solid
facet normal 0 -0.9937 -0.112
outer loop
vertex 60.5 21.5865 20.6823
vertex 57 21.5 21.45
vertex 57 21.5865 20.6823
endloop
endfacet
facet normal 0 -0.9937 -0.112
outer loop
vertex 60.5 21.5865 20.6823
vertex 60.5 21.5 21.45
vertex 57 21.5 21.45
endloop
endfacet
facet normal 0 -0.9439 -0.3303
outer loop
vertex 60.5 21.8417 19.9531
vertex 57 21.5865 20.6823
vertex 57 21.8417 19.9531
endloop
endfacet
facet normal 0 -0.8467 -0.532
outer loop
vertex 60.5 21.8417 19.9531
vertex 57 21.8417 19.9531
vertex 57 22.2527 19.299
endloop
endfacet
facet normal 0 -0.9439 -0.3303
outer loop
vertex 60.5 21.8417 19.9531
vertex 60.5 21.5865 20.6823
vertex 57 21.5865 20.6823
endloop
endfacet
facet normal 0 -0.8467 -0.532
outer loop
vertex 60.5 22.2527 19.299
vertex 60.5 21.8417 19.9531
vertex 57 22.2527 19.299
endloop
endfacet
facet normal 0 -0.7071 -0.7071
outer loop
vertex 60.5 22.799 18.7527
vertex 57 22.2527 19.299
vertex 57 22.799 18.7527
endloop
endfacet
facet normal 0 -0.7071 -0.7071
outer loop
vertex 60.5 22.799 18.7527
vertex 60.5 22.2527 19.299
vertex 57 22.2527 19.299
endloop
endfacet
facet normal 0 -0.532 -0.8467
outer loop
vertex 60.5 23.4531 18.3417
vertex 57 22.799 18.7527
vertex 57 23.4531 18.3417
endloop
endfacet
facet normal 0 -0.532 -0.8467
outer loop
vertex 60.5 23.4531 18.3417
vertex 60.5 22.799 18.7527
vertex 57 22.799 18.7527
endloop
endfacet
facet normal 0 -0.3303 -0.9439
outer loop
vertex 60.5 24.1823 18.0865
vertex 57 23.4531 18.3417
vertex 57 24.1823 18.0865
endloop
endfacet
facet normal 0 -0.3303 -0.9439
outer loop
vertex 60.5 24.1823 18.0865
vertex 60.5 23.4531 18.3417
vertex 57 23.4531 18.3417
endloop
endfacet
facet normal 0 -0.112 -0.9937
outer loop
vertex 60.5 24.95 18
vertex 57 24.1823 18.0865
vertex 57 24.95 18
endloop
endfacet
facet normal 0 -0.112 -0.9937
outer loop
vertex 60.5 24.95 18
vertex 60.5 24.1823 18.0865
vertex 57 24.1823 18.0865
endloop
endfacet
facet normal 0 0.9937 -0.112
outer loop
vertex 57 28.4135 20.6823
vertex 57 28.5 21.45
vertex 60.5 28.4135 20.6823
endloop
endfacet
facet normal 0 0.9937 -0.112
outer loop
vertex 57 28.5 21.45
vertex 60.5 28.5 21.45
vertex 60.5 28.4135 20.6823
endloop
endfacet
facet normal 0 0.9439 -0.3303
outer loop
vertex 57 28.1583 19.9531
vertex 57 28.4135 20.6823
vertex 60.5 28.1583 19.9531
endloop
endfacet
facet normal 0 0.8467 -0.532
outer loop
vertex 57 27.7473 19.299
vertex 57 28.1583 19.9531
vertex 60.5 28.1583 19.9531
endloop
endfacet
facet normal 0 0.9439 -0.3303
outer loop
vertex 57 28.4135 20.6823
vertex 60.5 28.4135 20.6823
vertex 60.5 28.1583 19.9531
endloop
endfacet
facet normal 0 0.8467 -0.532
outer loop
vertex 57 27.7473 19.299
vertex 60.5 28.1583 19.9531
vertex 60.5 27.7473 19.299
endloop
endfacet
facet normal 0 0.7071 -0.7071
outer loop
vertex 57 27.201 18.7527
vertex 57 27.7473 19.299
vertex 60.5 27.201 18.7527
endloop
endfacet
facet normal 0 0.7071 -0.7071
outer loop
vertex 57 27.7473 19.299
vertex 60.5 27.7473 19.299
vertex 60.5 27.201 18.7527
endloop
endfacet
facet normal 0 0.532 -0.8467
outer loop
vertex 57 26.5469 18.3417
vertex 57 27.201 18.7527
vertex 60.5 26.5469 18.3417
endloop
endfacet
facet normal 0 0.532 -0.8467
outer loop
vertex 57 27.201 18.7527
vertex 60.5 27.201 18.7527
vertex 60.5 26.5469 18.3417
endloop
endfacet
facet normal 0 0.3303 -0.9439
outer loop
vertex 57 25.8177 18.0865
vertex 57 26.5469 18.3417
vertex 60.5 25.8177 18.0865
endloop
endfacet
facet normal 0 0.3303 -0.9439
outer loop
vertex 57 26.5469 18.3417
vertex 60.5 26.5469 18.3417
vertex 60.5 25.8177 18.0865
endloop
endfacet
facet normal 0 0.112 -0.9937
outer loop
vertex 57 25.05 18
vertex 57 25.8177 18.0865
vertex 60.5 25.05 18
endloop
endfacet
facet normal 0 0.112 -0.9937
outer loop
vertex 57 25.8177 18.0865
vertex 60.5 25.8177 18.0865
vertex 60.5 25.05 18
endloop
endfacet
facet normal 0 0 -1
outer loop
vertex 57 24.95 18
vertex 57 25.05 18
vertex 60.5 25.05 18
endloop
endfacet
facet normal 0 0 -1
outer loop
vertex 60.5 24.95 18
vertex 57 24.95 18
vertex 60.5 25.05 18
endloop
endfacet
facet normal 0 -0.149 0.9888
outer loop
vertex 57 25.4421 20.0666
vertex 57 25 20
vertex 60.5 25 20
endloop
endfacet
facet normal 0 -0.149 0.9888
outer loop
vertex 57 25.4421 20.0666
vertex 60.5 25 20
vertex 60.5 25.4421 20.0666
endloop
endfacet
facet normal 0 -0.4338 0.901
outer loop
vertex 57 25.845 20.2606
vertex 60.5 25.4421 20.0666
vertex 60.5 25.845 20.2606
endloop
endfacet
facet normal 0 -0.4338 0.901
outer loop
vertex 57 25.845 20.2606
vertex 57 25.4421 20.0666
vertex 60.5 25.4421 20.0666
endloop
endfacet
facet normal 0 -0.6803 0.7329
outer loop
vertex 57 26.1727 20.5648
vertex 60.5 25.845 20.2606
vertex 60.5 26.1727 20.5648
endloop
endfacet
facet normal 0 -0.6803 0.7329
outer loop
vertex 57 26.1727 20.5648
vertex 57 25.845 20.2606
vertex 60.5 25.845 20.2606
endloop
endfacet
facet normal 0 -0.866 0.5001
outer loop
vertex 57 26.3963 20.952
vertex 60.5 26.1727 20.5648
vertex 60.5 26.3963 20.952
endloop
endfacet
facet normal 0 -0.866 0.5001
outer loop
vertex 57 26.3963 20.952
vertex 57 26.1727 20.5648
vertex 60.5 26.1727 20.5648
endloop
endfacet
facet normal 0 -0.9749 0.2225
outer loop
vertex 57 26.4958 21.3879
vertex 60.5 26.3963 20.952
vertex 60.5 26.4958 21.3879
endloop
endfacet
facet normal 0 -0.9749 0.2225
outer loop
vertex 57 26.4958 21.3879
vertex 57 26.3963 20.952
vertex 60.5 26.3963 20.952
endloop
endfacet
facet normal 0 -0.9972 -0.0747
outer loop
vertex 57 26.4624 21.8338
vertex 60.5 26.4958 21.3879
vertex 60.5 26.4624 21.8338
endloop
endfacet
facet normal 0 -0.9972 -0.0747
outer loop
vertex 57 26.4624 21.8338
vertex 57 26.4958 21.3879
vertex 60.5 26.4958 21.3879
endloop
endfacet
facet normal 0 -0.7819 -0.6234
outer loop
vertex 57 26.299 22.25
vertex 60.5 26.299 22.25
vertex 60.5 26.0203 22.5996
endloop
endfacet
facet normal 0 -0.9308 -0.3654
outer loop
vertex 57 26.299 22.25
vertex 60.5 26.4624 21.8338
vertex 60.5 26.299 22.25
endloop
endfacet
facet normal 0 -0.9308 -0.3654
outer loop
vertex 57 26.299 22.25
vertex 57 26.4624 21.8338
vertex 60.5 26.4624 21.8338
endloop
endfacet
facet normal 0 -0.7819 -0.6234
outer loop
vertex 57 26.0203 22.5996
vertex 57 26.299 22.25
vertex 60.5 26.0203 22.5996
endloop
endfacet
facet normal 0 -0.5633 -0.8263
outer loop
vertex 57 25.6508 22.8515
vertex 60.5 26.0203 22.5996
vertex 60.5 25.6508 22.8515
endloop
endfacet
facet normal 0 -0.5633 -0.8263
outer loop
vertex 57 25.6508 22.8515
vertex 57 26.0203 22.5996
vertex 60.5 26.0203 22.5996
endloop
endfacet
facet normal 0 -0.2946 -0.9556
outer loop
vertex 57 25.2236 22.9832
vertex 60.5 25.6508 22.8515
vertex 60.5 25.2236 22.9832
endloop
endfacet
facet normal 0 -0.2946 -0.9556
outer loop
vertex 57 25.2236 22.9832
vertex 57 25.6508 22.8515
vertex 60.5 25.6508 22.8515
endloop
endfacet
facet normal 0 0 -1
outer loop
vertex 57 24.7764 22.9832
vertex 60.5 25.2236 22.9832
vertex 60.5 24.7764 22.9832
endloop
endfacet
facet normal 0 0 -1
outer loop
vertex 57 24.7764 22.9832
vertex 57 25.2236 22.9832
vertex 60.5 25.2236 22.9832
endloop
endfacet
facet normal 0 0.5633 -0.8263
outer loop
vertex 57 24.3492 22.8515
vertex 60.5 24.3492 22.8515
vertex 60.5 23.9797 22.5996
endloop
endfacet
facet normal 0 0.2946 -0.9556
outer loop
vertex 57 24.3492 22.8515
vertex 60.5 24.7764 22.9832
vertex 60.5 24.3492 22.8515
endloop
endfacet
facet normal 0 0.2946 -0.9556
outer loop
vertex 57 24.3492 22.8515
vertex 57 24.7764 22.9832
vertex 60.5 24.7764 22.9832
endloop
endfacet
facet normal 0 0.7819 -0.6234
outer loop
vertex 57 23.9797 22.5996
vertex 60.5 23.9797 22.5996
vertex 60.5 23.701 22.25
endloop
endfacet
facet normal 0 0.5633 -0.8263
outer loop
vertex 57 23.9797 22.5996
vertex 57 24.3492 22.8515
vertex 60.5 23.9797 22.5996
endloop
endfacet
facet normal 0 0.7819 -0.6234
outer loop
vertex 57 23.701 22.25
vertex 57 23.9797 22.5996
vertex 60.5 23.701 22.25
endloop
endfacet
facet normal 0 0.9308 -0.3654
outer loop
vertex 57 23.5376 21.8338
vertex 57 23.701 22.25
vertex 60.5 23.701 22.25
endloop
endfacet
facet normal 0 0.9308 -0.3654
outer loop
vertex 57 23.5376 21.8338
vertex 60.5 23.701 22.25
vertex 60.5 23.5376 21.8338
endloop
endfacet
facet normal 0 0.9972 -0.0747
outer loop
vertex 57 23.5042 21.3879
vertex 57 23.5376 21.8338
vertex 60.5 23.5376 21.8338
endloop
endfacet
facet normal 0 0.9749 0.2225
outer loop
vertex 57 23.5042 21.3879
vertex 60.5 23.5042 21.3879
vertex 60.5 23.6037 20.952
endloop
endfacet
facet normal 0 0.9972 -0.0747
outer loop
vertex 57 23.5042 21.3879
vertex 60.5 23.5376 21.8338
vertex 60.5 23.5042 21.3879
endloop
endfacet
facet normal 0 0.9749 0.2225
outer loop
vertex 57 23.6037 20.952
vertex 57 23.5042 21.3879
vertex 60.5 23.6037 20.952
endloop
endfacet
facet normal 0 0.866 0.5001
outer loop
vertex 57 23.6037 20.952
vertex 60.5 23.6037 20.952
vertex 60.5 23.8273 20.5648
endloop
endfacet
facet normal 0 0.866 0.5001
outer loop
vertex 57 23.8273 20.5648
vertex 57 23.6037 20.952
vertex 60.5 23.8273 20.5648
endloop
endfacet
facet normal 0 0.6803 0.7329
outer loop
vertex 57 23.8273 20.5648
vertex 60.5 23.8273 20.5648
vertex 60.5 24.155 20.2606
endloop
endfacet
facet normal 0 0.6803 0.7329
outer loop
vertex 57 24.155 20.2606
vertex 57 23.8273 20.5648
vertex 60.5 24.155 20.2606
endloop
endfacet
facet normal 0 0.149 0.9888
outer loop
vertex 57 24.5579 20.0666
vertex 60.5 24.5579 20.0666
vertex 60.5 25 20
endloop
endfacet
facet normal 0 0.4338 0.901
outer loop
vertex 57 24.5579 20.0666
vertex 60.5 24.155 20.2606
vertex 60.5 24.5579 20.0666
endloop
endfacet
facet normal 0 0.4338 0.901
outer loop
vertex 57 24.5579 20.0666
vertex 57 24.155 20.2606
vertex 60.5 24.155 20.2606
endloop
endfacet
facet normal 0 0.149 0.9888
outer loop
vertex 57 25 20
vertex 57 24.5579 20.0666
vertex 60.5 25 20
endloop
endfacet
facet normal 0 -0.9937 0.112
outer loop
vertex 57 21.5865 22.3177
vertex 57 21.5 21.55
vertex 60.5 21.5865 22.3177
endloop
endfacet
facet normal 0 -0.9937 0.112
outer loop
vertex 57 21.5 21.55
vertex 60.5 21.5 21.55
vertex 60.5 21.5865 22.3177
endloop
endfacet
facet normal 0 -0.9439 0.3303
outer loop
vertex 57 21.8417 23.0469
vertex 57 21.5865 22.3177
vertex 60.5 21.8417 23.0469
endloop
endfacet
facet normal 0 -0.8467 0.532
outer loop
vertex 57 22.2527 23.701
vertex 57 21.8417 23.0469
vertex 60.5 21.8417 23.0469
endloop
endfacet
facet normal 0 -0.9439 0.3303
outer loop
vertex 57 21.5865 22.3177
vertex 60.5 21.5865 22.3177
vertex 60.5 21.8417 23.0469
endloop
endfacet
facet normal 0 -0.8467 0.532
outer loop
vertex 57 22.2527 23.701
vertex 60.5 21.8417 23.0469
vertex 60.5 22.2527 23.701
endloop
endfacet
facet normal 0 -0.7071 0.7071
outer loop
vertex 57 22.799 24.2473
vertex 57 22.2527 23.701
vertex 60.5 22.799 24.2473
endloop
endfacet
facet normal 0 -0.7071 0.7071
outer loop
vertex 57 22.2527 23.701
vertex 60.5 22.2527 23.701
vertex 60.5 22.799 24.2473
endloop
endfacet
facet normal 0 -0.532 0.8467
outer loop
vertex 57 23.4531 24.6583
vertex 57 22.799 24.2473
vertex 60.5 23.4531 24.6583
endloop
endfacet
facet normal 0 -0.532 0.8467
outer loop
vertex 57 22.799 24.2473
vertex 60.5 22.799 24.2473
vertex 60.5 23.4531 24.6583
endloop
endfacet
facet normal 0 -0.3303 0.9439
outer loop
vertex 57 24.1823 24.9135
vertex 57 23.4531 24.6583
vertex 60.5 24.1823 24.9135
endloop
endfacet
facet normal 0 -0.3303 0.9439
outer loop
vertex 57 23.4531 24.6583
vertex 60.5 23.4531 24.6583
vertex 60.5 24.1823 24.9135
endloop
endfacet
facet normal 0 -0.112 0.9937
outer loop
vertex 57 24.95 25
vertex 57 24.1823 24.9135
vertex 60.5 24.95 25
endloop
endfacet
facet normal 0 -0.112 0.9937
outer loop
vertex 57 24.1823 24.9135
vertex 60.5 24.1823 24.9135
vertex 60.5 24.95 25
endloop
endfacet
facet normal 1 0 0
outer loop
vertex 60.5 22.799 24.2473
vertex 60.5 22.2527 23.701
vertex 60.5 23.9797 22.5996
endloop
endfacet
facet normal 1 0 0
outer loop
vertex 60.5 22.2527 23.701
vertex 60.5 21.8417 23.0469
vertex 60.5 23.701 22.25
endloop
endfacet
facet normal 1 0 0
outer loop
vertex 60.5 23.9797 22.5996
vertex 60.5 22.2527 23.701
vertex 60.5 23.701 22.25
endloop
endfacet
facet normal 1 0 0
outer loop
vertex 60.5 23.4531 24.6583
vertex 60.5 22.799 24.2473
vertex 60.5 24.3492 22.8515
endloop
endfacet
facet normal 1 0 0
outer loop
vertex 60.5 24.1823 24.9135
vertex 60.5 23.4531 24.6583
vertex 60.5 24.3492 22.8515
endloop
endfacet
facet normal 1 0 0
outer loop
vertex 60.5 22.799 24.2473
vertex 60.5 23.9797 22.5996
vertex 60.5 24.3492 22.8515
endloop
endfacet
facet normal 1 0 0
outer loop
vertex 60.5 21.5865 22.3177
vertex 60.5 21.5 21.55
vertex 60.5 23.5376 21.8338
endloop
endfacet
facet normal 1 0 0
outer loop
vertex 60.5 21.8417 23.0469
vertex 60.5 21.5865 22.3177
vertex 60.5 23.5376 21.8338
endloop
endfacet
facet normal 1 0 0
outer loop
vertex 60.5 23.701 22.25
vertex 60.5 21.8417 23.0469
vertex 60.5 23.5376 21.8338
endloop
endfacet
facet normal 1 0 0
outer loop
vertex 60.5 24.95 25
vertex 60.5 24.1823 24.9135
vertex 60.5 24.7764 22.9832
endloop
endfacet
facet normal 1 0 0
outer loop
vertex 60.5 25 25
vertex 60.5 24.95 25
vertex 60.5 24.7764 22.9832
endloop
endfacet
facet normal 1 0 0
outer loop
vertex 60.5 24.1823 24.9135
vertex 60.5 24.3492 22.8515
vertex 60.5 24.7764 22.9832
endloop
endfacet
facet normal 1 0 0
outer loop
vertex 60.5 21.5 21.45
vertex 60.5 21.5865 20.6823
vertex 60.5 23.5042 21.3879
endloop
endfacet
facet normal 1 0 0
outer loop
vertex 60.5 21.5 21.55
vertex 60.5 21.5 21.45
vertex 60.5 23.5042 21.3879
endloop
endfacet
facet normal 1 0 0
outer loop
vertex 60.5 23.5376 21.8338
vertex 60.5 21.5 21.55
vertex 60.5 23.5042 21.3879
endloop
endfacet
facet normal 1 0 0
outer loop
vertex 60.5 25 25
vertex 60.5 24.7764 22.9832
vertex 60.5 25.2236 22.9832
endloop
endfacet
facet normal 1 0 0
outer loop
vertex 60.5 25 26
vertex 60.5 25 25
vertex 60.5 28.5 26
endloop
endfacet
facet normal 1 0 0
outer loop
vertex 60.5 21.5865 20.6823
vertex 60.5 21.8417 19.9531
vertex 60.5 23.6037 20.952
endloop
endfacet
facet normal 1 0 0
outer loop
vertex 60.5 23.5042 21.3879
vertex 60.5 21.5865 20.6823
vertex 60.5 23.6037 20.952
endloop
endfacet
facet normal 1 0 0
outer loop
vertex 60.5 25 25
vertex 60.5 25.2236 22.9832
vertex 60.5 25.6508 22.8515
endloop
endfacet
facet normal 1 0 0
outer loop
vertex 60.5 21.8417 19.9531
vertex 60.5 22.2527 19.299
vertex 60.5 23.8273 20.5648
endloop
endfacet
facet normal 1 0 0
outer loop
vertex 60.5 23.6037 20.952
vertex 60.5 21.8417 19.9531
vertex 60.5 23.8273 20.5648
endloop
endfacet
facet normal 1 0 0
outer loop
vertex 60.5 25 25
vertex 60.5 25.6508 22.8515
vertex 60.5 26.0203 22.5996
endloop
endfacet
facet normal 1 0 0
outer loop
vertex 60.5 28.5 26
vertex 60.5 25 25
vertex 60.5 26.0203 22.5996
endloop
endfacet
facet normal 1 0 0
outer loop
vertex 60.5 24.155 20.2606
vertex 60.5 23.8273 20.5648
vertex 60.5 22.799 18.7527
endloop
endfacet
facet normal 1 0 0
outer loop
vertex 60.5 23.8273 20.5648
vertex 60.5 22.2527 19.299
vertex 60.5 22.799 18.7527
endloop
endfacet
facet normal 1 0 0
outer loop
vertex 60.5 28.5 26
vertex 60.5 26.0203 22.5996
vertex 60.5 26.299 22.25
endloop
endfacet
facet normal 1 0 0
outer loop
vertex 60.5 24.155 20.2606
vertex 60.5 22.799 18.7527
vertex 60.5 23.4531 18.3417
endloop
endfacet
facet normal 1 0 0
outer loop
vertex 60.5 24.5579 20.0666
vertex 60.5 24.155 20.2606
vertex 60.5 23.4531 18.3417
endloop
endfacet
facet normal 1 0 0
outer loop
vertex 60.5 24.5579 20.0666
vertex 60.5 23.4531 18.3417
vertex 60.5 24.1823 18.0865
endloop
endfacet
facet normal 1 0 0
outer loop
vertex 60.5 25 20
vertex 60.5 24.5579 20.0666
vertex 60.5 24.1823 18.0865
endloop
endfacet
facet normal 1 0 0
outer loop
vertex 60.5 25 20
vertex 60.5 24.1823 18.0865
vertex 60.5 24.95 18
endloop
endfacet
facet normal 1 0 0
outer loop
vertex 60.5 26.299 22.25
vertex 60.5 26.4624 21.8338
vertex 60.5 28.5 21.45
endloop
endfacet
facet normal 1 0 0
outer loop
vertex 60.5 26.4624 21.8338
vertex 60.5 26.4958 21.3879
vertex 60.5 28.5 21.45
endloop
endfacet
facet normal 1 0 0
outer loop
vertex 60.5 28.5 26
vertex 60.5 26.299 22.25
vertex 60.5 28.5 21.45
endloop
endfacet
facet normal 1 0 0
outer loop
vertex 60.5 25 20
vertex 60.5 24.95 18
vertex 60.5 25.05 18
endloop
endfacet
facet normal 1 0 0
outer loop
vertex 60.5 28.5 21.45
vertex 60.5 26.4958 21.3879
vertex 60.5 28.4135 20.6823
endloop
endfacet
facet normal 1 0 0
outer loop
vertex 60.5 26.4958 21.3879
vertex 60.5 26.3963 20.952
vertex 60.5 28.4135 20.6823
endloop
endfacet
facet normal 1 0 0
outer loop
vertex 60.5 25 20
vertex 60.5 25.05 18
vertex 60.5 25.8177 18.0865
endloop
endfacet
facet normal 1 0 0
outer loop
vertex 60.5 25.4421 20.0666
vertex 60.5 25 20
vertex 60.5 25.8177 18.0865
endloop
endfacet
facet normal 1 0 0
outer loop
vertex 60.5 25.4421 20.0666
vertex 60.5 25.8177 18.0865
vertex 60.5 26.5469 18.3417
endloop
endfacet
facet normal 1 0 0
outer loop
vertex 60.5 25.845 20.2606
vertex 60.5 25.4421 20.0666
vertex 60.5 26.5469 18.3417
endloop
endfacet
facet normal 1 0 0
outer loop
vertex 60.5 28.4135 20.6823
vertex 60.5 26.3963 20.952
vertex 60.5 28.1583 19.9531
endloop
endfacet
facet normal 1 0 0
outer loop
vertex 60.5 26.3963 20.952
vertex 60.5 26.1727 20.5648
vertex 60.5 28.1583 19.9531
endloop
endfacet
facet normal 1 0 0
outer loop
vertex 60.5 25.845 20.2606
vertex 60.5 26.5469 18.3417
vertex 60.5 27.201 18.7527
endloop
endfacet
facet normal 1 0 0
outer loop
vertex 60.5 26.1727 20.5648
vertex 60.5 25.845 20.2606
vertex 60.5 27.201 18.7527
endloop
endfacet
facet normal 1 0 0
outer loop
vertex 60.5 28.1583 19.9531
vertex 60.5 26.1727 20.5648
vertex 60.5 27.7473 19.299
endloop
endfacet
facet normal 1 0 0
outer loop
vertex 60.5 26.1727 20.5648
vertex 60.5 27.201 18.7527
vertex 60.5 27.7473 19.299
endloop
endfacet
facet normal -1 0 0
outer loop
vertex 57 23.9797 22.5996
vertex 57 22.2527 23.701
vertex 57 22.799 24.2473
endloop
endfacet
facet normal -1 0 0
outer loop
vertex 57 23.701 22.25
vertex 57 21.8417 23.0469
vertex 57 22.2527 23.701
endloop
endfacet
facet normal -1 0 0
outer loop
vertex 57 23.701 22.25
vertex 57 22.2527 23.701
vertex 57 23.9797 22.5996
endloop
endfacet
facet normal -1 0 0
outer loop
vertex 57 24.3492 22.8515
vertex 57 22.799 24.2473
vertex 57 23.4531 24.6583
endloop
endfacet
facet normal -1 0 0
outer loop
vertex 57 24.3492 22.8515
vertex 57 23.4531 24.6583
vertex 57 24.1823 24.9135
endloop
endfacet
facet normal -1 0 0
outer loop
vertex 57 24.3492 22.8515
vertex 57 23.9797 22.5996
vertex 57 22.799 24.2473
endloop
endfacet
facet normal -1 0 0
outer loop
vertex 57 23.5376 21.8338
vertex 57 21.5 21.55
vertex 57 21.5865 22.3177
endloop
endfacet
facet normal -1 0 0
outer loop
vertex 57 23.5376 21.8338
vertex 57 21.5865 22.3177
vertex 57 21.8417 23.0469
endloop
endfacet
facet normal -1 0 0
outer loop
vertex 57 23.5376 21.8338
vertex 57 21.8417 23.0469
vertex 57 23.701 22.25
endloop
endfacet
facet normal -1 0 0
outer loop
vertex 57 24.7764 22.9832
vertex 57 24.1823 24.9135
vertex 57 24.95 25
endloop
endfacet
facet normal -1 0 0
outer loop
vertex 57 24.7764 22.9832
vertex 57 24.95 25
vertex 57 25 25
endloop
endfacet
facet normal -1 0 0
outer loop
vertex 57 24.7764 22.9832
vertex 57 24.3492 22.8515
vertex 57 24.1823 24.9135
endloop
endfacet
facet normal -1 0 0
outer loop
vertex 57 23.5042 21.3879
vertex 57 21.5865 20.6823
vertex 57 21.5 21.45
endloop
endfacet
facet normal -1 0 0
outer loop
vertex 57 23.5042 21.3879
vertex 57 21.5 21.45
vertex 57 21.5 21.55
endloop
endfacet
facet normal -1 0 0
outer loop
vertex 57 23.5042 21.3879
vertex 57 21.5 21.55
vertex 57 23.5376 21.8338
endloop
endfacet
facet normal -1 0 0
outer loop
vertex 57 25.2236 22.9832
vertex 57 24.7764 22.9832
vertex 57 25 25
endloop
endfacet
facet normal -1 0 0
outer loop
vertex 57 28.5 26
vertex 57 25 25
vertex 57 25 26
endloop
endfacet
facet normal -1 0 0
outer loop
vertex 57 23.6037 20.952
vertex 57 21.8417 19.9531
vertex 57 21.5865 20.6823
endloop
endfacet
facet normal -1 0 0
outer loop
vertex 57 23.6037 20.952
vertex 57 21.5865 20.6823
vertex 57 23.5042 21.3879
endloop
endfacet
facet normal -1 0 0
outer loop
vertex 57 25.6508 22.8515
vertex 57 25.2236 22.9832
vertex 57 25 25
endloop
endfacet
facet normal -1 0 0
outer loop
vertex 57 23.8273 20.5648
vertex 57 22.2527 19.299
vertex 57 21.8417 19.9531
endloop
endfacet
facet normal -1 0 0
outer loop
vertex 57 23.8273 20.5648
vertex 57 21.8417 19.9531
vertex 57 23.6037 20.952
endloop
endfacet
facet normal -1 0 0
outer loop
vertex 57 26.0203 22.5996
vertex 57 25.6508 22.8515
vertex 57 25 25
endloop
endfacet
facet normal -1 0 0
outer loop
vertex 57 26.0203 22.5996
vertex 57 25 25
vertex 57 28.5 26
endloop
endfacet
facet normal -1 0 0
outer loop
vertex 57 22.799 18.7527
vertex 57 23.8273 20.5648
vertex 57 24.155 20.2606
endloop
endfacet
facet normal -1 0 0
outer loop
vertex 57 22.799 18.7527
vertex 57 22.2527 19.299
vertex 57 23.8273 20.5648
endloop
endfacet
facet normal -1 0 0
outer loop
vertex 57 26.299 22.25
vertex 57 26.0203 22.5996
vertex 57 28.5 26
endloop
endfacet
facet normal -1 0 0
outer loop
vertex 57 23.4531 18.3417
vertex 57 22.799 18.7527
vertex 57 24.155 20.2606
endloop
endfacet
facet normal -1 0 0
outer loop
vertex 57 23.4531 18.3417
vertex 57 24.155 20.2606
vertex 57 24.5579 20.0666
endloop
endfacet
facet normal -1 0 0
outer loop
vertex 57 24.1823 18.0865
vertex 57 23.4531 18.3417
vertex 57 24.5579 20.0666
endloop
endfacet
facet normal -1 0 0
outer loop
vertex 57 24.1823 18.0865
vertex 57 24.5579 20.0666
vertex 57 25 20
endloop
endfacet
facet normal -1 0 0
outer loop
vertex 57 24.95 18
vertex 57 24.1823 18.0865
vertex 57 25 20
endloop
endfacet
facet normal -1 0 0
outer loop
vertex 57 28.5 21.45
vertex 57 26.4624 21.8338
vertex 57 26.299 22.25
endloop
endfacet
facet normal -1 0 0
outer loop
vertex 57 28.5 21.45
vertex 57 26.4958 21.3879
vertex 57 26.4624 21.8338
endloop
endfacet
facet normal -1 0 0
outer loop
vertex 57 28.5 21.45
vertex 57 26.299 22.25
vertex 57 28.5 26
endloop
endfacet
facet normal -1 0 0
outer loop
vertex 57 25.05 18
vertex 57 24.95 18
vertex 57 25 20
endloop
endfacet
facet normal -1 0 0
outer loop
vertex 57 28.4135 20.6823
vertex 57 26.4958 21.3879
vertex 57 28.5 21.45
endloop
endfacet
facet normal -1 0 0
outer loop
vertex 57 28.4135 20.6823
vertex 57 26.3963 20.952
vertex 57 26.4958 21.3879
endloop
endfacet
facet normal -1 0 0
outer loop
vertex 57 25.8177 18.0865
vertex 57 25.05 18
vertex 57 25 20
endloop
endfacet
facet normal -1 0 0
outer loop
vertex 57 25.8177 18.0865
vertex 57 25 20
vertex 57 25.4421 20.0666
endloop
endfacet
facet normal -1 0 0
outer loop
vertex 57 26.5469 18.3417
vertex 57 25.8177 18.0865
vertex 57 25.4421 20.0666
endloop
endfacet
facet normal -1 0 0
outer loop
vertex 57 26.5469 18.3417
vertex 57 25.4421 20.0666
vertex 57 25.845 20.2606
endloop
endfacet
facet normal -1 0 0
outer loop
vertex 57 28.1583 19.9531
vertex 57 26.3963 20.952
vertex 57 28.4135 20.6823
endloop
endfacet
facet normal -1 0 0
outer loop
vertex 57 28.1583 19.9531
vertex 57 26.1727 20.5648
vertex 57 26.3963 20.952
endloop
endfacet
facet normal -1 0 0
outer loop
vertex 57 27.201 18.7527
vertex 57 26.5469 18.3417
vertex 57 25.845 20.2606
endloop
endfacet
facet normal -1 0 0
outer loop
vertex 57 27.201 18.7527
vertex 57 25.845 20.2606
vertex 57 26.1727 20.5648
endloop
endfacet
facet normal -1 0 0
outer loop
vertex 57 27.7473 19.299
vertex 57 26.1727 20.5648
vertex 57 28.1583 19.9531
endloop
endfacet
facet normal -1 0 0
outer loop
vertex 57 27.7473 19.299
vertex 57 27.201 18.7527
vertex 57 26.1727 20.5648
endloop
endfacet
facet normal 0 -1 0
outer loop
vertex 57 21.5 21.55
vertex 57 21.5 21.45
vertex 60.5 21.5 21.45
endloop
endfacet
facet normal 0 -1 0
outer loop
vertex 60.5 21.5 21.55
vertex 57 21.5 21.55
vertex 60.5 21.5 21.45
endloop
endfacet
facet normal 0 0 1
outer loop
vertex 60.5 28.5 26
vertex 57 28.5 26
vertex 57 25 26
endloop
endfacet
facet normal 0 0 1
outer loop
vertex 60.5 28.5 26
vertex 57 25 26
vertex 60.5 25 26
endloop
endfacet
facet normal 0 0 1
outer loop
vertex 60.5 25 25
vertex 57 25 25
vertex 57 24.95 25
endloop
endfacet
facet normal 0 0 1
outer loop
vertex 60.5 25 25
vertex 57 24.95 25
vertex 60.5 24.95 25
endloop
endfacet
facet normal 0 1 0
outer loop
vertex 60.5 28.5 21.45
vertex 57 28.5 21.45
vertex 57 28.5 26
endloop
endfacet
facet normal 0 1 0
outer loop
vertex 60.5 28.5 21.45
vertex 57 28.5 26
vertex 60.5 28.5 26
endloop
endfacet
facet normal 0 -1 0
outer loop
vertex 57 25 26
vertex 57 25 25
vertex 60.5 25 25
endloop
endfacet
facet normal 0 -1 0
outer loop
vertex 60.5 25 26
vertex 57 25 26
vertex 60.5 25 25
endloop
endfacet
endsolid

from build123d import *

# Parameters (mm, degrees)
BOX012_W          = 3.5
BOX012_H          = 3.5
BOX012_DEPTH      = 1
CYLINDER003_R     = 1.5
CYLINDER003_DEPTH = 20
BOX011_W          = 3.5
BOX011_H          = 7
BOX011_DEPTH      = 7
FILLET002008002_R = 3.45


with BuildPart() as cube012:
    # Box012 → Box012 (new body)
    with BuildSketch(Plane(origin=(57, 25, 25), x_dir=(1, 0, 0), z_dir=(0, 0, 1))):
        with Locations((1.75, 1.75)):
            Rectangle(BOX012_W, BOX012_H)
    extrude(amount=BOX012_DEPTH)


with BuildPart() as cylinder003:
    # Cylinder003 → Cylinder003 (new body)
    with BuildSketch(Plane(origin=(56, 23, 21.5), x_dir=(0, 0, -1), z_dir=(1, 0, 0))):
        Circle(CYLINDER003_R)
    extrude(amount=CYLINDER003_DEPTH)


with BuildPart() as fusion001:
    # Box011 → Box011 (new body)
    with BuildSketch(Plane(origin=(57, 19.5, 18), x_dir=(1, 0, 0), z_dir=(0, 0, 1))):
        with Locations((1.75, 3.5)):
            Rectangle(BOX011_W, BOX011_H)
    extrude(amount=BOX011_DEPTH)

    # Fillet002008002
    fillet002008002_edges = [fusion001.edges().sort_by_distance(p)[0] for p in [
        (58.75, 19.5, 18),
        (58.75, 19.5, 25),
        (58.75, 26.5, 18),
    ]]
    fillet(fillet002008002_edges, radius=FILLET002008002_R)

    # Cut001: cut Cylinder003
    add(cylinder003.part, mode=Mode.SUBTRACT)


with BuildPart() as fusion001_1:
    # Cut001 placement: moved
    add(fusion001.part.moved(Location((0, 2, 0))))

    # Fusion001: union Cube012
    add(cube012.part)


solid = fusion001_1.part
